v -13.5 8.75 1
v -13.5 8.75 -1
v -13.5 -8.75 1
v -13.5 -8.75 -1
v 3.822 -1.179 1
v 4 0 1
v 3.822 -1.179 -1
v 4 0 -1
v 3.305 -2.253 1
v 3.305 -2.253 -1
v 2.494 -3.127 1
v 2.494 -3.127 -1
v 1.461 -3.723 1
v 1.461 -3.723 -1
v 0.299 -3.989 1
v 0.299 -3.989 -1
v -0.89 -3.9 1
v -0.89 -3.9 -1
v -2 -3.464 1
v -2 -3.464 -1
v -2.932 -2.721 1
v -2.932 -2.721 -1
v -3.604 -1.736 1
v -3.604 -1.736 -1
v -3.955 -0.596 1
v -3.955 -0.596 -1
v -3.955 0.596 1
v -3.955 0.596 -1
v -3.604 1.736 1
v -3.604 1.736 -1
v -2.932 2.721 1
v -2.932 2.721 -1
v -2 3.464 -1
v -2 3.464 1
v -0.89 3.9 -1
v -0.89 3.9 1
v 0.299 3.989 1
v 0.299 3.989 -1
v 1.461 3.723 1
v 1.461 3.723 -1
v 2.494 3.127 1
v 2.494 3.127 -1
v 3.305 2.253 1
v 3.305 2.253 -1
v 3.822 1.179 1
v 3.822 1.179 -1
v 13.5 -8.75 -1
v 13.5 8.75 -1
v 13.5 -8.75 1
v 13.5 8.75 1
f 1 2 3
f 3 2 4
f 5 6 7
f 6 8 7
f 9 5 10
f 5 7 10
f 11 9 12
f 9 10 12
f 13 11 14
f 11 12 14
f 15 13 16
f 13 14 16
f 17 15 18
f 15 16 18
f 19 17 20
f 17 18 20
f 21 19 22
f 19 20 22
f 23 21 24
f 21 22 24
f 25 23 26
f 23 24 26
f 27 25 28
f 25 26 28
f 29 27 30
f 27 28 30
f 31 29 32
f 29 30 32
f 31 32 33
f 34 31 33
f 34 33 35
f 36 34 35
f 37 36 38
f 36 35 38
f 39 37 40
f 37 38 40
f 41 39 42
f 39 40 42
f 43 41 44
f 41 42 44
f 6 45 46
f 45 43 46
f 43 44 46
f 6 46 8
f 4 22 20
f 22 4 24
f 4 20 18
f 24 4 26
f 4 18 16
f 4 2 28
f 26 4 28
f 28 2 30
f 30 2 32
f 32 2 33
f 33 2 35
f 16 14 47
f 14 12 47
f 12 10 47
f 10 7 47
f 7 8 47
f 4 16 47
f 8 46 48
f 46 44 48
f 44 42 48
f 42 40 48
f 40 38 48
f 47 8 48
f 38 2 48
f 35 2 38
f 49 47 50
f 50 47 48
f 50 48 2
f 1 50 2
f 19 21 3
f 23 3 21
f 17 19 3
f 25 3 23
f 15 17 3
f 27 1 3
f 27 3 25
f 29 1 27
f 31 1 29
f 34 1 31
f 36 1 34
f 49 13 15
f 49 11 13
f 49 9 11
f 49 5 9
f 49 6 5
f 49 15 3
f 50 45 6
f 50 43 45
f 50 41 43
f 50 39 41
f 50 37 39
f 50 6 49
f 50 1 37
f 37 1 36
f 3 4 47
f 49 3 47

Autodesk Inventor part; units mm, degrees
ref_plane "YZ Plane" through (0, 0, 0) normal (1, 0, 0) x (0, 1, 0)
ref_plane "XZ Plane" through (0, 0, 0) normal (0, 1, 0) x (-1, 0, 0)
ref_plane "XY Plane" through (0, 0, 0) normal (0, 0, 1) x (1, 0, 0)
sketch "Sketch1" plane through (0, 0, 0) normal (0, 0, 1) x (1, 0, 0)
  line L0 (-13.5, -8.75) -> (13.5, -8.75)
  line L1 (13.5, -8.75) -> (13.5, 8.75)
  line L2 (13.5, 8.75) -> (-13.5, 8.75)
  line L3 (-13.5, 8.75) -> (-13.5, -8.75)
  line L4 (0, 0) -> (0, 8.75) construction
  line L5 (0, 0) -> (13.5, 0) construction
  circle A0 centre (0, 0) radius 4
  dimension "d0" = 27
  dimension "d2" = 8
  dimension "d3" = 17.5
extrude "Extrusion1" add sketch "Sketch1" along normal mid plane 2
properties part number "20-028Z1" material "Steel, High Strength Low Alloy"
